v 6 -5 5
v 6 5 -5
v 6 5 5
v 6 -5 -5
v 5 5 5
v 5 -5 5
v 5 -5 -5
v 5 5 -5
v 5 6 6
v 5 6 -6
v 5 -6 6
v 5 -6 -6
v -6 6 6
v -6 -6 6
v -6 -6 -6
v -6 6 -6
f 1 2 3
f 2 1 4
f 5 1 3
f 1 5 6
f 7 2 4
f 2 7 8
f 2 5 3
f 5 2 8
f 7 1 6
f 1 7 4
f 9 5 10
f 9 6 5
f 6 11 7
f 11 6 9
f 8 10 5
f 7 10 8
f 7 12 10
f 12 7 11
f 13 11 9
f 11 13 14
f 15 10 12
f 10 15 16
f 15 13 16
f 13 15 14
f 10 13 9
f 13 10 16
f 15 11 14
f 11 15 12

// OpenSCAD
// Unit of length: Unit.MM
union()
{
   color(c = [1.0, 0.0, 0.0, 1.0])
   {
      translate(v = [0.5, 0.0, 0.0])
      {
         cube(size = [11.0, 10.0, 10.0], center = true);
      }
   }
   translate(v = [-0.5, 0.0, 0.0])
   {
      cube(size = [11.0, 12.0, 12.0], center = true);
   }
}
